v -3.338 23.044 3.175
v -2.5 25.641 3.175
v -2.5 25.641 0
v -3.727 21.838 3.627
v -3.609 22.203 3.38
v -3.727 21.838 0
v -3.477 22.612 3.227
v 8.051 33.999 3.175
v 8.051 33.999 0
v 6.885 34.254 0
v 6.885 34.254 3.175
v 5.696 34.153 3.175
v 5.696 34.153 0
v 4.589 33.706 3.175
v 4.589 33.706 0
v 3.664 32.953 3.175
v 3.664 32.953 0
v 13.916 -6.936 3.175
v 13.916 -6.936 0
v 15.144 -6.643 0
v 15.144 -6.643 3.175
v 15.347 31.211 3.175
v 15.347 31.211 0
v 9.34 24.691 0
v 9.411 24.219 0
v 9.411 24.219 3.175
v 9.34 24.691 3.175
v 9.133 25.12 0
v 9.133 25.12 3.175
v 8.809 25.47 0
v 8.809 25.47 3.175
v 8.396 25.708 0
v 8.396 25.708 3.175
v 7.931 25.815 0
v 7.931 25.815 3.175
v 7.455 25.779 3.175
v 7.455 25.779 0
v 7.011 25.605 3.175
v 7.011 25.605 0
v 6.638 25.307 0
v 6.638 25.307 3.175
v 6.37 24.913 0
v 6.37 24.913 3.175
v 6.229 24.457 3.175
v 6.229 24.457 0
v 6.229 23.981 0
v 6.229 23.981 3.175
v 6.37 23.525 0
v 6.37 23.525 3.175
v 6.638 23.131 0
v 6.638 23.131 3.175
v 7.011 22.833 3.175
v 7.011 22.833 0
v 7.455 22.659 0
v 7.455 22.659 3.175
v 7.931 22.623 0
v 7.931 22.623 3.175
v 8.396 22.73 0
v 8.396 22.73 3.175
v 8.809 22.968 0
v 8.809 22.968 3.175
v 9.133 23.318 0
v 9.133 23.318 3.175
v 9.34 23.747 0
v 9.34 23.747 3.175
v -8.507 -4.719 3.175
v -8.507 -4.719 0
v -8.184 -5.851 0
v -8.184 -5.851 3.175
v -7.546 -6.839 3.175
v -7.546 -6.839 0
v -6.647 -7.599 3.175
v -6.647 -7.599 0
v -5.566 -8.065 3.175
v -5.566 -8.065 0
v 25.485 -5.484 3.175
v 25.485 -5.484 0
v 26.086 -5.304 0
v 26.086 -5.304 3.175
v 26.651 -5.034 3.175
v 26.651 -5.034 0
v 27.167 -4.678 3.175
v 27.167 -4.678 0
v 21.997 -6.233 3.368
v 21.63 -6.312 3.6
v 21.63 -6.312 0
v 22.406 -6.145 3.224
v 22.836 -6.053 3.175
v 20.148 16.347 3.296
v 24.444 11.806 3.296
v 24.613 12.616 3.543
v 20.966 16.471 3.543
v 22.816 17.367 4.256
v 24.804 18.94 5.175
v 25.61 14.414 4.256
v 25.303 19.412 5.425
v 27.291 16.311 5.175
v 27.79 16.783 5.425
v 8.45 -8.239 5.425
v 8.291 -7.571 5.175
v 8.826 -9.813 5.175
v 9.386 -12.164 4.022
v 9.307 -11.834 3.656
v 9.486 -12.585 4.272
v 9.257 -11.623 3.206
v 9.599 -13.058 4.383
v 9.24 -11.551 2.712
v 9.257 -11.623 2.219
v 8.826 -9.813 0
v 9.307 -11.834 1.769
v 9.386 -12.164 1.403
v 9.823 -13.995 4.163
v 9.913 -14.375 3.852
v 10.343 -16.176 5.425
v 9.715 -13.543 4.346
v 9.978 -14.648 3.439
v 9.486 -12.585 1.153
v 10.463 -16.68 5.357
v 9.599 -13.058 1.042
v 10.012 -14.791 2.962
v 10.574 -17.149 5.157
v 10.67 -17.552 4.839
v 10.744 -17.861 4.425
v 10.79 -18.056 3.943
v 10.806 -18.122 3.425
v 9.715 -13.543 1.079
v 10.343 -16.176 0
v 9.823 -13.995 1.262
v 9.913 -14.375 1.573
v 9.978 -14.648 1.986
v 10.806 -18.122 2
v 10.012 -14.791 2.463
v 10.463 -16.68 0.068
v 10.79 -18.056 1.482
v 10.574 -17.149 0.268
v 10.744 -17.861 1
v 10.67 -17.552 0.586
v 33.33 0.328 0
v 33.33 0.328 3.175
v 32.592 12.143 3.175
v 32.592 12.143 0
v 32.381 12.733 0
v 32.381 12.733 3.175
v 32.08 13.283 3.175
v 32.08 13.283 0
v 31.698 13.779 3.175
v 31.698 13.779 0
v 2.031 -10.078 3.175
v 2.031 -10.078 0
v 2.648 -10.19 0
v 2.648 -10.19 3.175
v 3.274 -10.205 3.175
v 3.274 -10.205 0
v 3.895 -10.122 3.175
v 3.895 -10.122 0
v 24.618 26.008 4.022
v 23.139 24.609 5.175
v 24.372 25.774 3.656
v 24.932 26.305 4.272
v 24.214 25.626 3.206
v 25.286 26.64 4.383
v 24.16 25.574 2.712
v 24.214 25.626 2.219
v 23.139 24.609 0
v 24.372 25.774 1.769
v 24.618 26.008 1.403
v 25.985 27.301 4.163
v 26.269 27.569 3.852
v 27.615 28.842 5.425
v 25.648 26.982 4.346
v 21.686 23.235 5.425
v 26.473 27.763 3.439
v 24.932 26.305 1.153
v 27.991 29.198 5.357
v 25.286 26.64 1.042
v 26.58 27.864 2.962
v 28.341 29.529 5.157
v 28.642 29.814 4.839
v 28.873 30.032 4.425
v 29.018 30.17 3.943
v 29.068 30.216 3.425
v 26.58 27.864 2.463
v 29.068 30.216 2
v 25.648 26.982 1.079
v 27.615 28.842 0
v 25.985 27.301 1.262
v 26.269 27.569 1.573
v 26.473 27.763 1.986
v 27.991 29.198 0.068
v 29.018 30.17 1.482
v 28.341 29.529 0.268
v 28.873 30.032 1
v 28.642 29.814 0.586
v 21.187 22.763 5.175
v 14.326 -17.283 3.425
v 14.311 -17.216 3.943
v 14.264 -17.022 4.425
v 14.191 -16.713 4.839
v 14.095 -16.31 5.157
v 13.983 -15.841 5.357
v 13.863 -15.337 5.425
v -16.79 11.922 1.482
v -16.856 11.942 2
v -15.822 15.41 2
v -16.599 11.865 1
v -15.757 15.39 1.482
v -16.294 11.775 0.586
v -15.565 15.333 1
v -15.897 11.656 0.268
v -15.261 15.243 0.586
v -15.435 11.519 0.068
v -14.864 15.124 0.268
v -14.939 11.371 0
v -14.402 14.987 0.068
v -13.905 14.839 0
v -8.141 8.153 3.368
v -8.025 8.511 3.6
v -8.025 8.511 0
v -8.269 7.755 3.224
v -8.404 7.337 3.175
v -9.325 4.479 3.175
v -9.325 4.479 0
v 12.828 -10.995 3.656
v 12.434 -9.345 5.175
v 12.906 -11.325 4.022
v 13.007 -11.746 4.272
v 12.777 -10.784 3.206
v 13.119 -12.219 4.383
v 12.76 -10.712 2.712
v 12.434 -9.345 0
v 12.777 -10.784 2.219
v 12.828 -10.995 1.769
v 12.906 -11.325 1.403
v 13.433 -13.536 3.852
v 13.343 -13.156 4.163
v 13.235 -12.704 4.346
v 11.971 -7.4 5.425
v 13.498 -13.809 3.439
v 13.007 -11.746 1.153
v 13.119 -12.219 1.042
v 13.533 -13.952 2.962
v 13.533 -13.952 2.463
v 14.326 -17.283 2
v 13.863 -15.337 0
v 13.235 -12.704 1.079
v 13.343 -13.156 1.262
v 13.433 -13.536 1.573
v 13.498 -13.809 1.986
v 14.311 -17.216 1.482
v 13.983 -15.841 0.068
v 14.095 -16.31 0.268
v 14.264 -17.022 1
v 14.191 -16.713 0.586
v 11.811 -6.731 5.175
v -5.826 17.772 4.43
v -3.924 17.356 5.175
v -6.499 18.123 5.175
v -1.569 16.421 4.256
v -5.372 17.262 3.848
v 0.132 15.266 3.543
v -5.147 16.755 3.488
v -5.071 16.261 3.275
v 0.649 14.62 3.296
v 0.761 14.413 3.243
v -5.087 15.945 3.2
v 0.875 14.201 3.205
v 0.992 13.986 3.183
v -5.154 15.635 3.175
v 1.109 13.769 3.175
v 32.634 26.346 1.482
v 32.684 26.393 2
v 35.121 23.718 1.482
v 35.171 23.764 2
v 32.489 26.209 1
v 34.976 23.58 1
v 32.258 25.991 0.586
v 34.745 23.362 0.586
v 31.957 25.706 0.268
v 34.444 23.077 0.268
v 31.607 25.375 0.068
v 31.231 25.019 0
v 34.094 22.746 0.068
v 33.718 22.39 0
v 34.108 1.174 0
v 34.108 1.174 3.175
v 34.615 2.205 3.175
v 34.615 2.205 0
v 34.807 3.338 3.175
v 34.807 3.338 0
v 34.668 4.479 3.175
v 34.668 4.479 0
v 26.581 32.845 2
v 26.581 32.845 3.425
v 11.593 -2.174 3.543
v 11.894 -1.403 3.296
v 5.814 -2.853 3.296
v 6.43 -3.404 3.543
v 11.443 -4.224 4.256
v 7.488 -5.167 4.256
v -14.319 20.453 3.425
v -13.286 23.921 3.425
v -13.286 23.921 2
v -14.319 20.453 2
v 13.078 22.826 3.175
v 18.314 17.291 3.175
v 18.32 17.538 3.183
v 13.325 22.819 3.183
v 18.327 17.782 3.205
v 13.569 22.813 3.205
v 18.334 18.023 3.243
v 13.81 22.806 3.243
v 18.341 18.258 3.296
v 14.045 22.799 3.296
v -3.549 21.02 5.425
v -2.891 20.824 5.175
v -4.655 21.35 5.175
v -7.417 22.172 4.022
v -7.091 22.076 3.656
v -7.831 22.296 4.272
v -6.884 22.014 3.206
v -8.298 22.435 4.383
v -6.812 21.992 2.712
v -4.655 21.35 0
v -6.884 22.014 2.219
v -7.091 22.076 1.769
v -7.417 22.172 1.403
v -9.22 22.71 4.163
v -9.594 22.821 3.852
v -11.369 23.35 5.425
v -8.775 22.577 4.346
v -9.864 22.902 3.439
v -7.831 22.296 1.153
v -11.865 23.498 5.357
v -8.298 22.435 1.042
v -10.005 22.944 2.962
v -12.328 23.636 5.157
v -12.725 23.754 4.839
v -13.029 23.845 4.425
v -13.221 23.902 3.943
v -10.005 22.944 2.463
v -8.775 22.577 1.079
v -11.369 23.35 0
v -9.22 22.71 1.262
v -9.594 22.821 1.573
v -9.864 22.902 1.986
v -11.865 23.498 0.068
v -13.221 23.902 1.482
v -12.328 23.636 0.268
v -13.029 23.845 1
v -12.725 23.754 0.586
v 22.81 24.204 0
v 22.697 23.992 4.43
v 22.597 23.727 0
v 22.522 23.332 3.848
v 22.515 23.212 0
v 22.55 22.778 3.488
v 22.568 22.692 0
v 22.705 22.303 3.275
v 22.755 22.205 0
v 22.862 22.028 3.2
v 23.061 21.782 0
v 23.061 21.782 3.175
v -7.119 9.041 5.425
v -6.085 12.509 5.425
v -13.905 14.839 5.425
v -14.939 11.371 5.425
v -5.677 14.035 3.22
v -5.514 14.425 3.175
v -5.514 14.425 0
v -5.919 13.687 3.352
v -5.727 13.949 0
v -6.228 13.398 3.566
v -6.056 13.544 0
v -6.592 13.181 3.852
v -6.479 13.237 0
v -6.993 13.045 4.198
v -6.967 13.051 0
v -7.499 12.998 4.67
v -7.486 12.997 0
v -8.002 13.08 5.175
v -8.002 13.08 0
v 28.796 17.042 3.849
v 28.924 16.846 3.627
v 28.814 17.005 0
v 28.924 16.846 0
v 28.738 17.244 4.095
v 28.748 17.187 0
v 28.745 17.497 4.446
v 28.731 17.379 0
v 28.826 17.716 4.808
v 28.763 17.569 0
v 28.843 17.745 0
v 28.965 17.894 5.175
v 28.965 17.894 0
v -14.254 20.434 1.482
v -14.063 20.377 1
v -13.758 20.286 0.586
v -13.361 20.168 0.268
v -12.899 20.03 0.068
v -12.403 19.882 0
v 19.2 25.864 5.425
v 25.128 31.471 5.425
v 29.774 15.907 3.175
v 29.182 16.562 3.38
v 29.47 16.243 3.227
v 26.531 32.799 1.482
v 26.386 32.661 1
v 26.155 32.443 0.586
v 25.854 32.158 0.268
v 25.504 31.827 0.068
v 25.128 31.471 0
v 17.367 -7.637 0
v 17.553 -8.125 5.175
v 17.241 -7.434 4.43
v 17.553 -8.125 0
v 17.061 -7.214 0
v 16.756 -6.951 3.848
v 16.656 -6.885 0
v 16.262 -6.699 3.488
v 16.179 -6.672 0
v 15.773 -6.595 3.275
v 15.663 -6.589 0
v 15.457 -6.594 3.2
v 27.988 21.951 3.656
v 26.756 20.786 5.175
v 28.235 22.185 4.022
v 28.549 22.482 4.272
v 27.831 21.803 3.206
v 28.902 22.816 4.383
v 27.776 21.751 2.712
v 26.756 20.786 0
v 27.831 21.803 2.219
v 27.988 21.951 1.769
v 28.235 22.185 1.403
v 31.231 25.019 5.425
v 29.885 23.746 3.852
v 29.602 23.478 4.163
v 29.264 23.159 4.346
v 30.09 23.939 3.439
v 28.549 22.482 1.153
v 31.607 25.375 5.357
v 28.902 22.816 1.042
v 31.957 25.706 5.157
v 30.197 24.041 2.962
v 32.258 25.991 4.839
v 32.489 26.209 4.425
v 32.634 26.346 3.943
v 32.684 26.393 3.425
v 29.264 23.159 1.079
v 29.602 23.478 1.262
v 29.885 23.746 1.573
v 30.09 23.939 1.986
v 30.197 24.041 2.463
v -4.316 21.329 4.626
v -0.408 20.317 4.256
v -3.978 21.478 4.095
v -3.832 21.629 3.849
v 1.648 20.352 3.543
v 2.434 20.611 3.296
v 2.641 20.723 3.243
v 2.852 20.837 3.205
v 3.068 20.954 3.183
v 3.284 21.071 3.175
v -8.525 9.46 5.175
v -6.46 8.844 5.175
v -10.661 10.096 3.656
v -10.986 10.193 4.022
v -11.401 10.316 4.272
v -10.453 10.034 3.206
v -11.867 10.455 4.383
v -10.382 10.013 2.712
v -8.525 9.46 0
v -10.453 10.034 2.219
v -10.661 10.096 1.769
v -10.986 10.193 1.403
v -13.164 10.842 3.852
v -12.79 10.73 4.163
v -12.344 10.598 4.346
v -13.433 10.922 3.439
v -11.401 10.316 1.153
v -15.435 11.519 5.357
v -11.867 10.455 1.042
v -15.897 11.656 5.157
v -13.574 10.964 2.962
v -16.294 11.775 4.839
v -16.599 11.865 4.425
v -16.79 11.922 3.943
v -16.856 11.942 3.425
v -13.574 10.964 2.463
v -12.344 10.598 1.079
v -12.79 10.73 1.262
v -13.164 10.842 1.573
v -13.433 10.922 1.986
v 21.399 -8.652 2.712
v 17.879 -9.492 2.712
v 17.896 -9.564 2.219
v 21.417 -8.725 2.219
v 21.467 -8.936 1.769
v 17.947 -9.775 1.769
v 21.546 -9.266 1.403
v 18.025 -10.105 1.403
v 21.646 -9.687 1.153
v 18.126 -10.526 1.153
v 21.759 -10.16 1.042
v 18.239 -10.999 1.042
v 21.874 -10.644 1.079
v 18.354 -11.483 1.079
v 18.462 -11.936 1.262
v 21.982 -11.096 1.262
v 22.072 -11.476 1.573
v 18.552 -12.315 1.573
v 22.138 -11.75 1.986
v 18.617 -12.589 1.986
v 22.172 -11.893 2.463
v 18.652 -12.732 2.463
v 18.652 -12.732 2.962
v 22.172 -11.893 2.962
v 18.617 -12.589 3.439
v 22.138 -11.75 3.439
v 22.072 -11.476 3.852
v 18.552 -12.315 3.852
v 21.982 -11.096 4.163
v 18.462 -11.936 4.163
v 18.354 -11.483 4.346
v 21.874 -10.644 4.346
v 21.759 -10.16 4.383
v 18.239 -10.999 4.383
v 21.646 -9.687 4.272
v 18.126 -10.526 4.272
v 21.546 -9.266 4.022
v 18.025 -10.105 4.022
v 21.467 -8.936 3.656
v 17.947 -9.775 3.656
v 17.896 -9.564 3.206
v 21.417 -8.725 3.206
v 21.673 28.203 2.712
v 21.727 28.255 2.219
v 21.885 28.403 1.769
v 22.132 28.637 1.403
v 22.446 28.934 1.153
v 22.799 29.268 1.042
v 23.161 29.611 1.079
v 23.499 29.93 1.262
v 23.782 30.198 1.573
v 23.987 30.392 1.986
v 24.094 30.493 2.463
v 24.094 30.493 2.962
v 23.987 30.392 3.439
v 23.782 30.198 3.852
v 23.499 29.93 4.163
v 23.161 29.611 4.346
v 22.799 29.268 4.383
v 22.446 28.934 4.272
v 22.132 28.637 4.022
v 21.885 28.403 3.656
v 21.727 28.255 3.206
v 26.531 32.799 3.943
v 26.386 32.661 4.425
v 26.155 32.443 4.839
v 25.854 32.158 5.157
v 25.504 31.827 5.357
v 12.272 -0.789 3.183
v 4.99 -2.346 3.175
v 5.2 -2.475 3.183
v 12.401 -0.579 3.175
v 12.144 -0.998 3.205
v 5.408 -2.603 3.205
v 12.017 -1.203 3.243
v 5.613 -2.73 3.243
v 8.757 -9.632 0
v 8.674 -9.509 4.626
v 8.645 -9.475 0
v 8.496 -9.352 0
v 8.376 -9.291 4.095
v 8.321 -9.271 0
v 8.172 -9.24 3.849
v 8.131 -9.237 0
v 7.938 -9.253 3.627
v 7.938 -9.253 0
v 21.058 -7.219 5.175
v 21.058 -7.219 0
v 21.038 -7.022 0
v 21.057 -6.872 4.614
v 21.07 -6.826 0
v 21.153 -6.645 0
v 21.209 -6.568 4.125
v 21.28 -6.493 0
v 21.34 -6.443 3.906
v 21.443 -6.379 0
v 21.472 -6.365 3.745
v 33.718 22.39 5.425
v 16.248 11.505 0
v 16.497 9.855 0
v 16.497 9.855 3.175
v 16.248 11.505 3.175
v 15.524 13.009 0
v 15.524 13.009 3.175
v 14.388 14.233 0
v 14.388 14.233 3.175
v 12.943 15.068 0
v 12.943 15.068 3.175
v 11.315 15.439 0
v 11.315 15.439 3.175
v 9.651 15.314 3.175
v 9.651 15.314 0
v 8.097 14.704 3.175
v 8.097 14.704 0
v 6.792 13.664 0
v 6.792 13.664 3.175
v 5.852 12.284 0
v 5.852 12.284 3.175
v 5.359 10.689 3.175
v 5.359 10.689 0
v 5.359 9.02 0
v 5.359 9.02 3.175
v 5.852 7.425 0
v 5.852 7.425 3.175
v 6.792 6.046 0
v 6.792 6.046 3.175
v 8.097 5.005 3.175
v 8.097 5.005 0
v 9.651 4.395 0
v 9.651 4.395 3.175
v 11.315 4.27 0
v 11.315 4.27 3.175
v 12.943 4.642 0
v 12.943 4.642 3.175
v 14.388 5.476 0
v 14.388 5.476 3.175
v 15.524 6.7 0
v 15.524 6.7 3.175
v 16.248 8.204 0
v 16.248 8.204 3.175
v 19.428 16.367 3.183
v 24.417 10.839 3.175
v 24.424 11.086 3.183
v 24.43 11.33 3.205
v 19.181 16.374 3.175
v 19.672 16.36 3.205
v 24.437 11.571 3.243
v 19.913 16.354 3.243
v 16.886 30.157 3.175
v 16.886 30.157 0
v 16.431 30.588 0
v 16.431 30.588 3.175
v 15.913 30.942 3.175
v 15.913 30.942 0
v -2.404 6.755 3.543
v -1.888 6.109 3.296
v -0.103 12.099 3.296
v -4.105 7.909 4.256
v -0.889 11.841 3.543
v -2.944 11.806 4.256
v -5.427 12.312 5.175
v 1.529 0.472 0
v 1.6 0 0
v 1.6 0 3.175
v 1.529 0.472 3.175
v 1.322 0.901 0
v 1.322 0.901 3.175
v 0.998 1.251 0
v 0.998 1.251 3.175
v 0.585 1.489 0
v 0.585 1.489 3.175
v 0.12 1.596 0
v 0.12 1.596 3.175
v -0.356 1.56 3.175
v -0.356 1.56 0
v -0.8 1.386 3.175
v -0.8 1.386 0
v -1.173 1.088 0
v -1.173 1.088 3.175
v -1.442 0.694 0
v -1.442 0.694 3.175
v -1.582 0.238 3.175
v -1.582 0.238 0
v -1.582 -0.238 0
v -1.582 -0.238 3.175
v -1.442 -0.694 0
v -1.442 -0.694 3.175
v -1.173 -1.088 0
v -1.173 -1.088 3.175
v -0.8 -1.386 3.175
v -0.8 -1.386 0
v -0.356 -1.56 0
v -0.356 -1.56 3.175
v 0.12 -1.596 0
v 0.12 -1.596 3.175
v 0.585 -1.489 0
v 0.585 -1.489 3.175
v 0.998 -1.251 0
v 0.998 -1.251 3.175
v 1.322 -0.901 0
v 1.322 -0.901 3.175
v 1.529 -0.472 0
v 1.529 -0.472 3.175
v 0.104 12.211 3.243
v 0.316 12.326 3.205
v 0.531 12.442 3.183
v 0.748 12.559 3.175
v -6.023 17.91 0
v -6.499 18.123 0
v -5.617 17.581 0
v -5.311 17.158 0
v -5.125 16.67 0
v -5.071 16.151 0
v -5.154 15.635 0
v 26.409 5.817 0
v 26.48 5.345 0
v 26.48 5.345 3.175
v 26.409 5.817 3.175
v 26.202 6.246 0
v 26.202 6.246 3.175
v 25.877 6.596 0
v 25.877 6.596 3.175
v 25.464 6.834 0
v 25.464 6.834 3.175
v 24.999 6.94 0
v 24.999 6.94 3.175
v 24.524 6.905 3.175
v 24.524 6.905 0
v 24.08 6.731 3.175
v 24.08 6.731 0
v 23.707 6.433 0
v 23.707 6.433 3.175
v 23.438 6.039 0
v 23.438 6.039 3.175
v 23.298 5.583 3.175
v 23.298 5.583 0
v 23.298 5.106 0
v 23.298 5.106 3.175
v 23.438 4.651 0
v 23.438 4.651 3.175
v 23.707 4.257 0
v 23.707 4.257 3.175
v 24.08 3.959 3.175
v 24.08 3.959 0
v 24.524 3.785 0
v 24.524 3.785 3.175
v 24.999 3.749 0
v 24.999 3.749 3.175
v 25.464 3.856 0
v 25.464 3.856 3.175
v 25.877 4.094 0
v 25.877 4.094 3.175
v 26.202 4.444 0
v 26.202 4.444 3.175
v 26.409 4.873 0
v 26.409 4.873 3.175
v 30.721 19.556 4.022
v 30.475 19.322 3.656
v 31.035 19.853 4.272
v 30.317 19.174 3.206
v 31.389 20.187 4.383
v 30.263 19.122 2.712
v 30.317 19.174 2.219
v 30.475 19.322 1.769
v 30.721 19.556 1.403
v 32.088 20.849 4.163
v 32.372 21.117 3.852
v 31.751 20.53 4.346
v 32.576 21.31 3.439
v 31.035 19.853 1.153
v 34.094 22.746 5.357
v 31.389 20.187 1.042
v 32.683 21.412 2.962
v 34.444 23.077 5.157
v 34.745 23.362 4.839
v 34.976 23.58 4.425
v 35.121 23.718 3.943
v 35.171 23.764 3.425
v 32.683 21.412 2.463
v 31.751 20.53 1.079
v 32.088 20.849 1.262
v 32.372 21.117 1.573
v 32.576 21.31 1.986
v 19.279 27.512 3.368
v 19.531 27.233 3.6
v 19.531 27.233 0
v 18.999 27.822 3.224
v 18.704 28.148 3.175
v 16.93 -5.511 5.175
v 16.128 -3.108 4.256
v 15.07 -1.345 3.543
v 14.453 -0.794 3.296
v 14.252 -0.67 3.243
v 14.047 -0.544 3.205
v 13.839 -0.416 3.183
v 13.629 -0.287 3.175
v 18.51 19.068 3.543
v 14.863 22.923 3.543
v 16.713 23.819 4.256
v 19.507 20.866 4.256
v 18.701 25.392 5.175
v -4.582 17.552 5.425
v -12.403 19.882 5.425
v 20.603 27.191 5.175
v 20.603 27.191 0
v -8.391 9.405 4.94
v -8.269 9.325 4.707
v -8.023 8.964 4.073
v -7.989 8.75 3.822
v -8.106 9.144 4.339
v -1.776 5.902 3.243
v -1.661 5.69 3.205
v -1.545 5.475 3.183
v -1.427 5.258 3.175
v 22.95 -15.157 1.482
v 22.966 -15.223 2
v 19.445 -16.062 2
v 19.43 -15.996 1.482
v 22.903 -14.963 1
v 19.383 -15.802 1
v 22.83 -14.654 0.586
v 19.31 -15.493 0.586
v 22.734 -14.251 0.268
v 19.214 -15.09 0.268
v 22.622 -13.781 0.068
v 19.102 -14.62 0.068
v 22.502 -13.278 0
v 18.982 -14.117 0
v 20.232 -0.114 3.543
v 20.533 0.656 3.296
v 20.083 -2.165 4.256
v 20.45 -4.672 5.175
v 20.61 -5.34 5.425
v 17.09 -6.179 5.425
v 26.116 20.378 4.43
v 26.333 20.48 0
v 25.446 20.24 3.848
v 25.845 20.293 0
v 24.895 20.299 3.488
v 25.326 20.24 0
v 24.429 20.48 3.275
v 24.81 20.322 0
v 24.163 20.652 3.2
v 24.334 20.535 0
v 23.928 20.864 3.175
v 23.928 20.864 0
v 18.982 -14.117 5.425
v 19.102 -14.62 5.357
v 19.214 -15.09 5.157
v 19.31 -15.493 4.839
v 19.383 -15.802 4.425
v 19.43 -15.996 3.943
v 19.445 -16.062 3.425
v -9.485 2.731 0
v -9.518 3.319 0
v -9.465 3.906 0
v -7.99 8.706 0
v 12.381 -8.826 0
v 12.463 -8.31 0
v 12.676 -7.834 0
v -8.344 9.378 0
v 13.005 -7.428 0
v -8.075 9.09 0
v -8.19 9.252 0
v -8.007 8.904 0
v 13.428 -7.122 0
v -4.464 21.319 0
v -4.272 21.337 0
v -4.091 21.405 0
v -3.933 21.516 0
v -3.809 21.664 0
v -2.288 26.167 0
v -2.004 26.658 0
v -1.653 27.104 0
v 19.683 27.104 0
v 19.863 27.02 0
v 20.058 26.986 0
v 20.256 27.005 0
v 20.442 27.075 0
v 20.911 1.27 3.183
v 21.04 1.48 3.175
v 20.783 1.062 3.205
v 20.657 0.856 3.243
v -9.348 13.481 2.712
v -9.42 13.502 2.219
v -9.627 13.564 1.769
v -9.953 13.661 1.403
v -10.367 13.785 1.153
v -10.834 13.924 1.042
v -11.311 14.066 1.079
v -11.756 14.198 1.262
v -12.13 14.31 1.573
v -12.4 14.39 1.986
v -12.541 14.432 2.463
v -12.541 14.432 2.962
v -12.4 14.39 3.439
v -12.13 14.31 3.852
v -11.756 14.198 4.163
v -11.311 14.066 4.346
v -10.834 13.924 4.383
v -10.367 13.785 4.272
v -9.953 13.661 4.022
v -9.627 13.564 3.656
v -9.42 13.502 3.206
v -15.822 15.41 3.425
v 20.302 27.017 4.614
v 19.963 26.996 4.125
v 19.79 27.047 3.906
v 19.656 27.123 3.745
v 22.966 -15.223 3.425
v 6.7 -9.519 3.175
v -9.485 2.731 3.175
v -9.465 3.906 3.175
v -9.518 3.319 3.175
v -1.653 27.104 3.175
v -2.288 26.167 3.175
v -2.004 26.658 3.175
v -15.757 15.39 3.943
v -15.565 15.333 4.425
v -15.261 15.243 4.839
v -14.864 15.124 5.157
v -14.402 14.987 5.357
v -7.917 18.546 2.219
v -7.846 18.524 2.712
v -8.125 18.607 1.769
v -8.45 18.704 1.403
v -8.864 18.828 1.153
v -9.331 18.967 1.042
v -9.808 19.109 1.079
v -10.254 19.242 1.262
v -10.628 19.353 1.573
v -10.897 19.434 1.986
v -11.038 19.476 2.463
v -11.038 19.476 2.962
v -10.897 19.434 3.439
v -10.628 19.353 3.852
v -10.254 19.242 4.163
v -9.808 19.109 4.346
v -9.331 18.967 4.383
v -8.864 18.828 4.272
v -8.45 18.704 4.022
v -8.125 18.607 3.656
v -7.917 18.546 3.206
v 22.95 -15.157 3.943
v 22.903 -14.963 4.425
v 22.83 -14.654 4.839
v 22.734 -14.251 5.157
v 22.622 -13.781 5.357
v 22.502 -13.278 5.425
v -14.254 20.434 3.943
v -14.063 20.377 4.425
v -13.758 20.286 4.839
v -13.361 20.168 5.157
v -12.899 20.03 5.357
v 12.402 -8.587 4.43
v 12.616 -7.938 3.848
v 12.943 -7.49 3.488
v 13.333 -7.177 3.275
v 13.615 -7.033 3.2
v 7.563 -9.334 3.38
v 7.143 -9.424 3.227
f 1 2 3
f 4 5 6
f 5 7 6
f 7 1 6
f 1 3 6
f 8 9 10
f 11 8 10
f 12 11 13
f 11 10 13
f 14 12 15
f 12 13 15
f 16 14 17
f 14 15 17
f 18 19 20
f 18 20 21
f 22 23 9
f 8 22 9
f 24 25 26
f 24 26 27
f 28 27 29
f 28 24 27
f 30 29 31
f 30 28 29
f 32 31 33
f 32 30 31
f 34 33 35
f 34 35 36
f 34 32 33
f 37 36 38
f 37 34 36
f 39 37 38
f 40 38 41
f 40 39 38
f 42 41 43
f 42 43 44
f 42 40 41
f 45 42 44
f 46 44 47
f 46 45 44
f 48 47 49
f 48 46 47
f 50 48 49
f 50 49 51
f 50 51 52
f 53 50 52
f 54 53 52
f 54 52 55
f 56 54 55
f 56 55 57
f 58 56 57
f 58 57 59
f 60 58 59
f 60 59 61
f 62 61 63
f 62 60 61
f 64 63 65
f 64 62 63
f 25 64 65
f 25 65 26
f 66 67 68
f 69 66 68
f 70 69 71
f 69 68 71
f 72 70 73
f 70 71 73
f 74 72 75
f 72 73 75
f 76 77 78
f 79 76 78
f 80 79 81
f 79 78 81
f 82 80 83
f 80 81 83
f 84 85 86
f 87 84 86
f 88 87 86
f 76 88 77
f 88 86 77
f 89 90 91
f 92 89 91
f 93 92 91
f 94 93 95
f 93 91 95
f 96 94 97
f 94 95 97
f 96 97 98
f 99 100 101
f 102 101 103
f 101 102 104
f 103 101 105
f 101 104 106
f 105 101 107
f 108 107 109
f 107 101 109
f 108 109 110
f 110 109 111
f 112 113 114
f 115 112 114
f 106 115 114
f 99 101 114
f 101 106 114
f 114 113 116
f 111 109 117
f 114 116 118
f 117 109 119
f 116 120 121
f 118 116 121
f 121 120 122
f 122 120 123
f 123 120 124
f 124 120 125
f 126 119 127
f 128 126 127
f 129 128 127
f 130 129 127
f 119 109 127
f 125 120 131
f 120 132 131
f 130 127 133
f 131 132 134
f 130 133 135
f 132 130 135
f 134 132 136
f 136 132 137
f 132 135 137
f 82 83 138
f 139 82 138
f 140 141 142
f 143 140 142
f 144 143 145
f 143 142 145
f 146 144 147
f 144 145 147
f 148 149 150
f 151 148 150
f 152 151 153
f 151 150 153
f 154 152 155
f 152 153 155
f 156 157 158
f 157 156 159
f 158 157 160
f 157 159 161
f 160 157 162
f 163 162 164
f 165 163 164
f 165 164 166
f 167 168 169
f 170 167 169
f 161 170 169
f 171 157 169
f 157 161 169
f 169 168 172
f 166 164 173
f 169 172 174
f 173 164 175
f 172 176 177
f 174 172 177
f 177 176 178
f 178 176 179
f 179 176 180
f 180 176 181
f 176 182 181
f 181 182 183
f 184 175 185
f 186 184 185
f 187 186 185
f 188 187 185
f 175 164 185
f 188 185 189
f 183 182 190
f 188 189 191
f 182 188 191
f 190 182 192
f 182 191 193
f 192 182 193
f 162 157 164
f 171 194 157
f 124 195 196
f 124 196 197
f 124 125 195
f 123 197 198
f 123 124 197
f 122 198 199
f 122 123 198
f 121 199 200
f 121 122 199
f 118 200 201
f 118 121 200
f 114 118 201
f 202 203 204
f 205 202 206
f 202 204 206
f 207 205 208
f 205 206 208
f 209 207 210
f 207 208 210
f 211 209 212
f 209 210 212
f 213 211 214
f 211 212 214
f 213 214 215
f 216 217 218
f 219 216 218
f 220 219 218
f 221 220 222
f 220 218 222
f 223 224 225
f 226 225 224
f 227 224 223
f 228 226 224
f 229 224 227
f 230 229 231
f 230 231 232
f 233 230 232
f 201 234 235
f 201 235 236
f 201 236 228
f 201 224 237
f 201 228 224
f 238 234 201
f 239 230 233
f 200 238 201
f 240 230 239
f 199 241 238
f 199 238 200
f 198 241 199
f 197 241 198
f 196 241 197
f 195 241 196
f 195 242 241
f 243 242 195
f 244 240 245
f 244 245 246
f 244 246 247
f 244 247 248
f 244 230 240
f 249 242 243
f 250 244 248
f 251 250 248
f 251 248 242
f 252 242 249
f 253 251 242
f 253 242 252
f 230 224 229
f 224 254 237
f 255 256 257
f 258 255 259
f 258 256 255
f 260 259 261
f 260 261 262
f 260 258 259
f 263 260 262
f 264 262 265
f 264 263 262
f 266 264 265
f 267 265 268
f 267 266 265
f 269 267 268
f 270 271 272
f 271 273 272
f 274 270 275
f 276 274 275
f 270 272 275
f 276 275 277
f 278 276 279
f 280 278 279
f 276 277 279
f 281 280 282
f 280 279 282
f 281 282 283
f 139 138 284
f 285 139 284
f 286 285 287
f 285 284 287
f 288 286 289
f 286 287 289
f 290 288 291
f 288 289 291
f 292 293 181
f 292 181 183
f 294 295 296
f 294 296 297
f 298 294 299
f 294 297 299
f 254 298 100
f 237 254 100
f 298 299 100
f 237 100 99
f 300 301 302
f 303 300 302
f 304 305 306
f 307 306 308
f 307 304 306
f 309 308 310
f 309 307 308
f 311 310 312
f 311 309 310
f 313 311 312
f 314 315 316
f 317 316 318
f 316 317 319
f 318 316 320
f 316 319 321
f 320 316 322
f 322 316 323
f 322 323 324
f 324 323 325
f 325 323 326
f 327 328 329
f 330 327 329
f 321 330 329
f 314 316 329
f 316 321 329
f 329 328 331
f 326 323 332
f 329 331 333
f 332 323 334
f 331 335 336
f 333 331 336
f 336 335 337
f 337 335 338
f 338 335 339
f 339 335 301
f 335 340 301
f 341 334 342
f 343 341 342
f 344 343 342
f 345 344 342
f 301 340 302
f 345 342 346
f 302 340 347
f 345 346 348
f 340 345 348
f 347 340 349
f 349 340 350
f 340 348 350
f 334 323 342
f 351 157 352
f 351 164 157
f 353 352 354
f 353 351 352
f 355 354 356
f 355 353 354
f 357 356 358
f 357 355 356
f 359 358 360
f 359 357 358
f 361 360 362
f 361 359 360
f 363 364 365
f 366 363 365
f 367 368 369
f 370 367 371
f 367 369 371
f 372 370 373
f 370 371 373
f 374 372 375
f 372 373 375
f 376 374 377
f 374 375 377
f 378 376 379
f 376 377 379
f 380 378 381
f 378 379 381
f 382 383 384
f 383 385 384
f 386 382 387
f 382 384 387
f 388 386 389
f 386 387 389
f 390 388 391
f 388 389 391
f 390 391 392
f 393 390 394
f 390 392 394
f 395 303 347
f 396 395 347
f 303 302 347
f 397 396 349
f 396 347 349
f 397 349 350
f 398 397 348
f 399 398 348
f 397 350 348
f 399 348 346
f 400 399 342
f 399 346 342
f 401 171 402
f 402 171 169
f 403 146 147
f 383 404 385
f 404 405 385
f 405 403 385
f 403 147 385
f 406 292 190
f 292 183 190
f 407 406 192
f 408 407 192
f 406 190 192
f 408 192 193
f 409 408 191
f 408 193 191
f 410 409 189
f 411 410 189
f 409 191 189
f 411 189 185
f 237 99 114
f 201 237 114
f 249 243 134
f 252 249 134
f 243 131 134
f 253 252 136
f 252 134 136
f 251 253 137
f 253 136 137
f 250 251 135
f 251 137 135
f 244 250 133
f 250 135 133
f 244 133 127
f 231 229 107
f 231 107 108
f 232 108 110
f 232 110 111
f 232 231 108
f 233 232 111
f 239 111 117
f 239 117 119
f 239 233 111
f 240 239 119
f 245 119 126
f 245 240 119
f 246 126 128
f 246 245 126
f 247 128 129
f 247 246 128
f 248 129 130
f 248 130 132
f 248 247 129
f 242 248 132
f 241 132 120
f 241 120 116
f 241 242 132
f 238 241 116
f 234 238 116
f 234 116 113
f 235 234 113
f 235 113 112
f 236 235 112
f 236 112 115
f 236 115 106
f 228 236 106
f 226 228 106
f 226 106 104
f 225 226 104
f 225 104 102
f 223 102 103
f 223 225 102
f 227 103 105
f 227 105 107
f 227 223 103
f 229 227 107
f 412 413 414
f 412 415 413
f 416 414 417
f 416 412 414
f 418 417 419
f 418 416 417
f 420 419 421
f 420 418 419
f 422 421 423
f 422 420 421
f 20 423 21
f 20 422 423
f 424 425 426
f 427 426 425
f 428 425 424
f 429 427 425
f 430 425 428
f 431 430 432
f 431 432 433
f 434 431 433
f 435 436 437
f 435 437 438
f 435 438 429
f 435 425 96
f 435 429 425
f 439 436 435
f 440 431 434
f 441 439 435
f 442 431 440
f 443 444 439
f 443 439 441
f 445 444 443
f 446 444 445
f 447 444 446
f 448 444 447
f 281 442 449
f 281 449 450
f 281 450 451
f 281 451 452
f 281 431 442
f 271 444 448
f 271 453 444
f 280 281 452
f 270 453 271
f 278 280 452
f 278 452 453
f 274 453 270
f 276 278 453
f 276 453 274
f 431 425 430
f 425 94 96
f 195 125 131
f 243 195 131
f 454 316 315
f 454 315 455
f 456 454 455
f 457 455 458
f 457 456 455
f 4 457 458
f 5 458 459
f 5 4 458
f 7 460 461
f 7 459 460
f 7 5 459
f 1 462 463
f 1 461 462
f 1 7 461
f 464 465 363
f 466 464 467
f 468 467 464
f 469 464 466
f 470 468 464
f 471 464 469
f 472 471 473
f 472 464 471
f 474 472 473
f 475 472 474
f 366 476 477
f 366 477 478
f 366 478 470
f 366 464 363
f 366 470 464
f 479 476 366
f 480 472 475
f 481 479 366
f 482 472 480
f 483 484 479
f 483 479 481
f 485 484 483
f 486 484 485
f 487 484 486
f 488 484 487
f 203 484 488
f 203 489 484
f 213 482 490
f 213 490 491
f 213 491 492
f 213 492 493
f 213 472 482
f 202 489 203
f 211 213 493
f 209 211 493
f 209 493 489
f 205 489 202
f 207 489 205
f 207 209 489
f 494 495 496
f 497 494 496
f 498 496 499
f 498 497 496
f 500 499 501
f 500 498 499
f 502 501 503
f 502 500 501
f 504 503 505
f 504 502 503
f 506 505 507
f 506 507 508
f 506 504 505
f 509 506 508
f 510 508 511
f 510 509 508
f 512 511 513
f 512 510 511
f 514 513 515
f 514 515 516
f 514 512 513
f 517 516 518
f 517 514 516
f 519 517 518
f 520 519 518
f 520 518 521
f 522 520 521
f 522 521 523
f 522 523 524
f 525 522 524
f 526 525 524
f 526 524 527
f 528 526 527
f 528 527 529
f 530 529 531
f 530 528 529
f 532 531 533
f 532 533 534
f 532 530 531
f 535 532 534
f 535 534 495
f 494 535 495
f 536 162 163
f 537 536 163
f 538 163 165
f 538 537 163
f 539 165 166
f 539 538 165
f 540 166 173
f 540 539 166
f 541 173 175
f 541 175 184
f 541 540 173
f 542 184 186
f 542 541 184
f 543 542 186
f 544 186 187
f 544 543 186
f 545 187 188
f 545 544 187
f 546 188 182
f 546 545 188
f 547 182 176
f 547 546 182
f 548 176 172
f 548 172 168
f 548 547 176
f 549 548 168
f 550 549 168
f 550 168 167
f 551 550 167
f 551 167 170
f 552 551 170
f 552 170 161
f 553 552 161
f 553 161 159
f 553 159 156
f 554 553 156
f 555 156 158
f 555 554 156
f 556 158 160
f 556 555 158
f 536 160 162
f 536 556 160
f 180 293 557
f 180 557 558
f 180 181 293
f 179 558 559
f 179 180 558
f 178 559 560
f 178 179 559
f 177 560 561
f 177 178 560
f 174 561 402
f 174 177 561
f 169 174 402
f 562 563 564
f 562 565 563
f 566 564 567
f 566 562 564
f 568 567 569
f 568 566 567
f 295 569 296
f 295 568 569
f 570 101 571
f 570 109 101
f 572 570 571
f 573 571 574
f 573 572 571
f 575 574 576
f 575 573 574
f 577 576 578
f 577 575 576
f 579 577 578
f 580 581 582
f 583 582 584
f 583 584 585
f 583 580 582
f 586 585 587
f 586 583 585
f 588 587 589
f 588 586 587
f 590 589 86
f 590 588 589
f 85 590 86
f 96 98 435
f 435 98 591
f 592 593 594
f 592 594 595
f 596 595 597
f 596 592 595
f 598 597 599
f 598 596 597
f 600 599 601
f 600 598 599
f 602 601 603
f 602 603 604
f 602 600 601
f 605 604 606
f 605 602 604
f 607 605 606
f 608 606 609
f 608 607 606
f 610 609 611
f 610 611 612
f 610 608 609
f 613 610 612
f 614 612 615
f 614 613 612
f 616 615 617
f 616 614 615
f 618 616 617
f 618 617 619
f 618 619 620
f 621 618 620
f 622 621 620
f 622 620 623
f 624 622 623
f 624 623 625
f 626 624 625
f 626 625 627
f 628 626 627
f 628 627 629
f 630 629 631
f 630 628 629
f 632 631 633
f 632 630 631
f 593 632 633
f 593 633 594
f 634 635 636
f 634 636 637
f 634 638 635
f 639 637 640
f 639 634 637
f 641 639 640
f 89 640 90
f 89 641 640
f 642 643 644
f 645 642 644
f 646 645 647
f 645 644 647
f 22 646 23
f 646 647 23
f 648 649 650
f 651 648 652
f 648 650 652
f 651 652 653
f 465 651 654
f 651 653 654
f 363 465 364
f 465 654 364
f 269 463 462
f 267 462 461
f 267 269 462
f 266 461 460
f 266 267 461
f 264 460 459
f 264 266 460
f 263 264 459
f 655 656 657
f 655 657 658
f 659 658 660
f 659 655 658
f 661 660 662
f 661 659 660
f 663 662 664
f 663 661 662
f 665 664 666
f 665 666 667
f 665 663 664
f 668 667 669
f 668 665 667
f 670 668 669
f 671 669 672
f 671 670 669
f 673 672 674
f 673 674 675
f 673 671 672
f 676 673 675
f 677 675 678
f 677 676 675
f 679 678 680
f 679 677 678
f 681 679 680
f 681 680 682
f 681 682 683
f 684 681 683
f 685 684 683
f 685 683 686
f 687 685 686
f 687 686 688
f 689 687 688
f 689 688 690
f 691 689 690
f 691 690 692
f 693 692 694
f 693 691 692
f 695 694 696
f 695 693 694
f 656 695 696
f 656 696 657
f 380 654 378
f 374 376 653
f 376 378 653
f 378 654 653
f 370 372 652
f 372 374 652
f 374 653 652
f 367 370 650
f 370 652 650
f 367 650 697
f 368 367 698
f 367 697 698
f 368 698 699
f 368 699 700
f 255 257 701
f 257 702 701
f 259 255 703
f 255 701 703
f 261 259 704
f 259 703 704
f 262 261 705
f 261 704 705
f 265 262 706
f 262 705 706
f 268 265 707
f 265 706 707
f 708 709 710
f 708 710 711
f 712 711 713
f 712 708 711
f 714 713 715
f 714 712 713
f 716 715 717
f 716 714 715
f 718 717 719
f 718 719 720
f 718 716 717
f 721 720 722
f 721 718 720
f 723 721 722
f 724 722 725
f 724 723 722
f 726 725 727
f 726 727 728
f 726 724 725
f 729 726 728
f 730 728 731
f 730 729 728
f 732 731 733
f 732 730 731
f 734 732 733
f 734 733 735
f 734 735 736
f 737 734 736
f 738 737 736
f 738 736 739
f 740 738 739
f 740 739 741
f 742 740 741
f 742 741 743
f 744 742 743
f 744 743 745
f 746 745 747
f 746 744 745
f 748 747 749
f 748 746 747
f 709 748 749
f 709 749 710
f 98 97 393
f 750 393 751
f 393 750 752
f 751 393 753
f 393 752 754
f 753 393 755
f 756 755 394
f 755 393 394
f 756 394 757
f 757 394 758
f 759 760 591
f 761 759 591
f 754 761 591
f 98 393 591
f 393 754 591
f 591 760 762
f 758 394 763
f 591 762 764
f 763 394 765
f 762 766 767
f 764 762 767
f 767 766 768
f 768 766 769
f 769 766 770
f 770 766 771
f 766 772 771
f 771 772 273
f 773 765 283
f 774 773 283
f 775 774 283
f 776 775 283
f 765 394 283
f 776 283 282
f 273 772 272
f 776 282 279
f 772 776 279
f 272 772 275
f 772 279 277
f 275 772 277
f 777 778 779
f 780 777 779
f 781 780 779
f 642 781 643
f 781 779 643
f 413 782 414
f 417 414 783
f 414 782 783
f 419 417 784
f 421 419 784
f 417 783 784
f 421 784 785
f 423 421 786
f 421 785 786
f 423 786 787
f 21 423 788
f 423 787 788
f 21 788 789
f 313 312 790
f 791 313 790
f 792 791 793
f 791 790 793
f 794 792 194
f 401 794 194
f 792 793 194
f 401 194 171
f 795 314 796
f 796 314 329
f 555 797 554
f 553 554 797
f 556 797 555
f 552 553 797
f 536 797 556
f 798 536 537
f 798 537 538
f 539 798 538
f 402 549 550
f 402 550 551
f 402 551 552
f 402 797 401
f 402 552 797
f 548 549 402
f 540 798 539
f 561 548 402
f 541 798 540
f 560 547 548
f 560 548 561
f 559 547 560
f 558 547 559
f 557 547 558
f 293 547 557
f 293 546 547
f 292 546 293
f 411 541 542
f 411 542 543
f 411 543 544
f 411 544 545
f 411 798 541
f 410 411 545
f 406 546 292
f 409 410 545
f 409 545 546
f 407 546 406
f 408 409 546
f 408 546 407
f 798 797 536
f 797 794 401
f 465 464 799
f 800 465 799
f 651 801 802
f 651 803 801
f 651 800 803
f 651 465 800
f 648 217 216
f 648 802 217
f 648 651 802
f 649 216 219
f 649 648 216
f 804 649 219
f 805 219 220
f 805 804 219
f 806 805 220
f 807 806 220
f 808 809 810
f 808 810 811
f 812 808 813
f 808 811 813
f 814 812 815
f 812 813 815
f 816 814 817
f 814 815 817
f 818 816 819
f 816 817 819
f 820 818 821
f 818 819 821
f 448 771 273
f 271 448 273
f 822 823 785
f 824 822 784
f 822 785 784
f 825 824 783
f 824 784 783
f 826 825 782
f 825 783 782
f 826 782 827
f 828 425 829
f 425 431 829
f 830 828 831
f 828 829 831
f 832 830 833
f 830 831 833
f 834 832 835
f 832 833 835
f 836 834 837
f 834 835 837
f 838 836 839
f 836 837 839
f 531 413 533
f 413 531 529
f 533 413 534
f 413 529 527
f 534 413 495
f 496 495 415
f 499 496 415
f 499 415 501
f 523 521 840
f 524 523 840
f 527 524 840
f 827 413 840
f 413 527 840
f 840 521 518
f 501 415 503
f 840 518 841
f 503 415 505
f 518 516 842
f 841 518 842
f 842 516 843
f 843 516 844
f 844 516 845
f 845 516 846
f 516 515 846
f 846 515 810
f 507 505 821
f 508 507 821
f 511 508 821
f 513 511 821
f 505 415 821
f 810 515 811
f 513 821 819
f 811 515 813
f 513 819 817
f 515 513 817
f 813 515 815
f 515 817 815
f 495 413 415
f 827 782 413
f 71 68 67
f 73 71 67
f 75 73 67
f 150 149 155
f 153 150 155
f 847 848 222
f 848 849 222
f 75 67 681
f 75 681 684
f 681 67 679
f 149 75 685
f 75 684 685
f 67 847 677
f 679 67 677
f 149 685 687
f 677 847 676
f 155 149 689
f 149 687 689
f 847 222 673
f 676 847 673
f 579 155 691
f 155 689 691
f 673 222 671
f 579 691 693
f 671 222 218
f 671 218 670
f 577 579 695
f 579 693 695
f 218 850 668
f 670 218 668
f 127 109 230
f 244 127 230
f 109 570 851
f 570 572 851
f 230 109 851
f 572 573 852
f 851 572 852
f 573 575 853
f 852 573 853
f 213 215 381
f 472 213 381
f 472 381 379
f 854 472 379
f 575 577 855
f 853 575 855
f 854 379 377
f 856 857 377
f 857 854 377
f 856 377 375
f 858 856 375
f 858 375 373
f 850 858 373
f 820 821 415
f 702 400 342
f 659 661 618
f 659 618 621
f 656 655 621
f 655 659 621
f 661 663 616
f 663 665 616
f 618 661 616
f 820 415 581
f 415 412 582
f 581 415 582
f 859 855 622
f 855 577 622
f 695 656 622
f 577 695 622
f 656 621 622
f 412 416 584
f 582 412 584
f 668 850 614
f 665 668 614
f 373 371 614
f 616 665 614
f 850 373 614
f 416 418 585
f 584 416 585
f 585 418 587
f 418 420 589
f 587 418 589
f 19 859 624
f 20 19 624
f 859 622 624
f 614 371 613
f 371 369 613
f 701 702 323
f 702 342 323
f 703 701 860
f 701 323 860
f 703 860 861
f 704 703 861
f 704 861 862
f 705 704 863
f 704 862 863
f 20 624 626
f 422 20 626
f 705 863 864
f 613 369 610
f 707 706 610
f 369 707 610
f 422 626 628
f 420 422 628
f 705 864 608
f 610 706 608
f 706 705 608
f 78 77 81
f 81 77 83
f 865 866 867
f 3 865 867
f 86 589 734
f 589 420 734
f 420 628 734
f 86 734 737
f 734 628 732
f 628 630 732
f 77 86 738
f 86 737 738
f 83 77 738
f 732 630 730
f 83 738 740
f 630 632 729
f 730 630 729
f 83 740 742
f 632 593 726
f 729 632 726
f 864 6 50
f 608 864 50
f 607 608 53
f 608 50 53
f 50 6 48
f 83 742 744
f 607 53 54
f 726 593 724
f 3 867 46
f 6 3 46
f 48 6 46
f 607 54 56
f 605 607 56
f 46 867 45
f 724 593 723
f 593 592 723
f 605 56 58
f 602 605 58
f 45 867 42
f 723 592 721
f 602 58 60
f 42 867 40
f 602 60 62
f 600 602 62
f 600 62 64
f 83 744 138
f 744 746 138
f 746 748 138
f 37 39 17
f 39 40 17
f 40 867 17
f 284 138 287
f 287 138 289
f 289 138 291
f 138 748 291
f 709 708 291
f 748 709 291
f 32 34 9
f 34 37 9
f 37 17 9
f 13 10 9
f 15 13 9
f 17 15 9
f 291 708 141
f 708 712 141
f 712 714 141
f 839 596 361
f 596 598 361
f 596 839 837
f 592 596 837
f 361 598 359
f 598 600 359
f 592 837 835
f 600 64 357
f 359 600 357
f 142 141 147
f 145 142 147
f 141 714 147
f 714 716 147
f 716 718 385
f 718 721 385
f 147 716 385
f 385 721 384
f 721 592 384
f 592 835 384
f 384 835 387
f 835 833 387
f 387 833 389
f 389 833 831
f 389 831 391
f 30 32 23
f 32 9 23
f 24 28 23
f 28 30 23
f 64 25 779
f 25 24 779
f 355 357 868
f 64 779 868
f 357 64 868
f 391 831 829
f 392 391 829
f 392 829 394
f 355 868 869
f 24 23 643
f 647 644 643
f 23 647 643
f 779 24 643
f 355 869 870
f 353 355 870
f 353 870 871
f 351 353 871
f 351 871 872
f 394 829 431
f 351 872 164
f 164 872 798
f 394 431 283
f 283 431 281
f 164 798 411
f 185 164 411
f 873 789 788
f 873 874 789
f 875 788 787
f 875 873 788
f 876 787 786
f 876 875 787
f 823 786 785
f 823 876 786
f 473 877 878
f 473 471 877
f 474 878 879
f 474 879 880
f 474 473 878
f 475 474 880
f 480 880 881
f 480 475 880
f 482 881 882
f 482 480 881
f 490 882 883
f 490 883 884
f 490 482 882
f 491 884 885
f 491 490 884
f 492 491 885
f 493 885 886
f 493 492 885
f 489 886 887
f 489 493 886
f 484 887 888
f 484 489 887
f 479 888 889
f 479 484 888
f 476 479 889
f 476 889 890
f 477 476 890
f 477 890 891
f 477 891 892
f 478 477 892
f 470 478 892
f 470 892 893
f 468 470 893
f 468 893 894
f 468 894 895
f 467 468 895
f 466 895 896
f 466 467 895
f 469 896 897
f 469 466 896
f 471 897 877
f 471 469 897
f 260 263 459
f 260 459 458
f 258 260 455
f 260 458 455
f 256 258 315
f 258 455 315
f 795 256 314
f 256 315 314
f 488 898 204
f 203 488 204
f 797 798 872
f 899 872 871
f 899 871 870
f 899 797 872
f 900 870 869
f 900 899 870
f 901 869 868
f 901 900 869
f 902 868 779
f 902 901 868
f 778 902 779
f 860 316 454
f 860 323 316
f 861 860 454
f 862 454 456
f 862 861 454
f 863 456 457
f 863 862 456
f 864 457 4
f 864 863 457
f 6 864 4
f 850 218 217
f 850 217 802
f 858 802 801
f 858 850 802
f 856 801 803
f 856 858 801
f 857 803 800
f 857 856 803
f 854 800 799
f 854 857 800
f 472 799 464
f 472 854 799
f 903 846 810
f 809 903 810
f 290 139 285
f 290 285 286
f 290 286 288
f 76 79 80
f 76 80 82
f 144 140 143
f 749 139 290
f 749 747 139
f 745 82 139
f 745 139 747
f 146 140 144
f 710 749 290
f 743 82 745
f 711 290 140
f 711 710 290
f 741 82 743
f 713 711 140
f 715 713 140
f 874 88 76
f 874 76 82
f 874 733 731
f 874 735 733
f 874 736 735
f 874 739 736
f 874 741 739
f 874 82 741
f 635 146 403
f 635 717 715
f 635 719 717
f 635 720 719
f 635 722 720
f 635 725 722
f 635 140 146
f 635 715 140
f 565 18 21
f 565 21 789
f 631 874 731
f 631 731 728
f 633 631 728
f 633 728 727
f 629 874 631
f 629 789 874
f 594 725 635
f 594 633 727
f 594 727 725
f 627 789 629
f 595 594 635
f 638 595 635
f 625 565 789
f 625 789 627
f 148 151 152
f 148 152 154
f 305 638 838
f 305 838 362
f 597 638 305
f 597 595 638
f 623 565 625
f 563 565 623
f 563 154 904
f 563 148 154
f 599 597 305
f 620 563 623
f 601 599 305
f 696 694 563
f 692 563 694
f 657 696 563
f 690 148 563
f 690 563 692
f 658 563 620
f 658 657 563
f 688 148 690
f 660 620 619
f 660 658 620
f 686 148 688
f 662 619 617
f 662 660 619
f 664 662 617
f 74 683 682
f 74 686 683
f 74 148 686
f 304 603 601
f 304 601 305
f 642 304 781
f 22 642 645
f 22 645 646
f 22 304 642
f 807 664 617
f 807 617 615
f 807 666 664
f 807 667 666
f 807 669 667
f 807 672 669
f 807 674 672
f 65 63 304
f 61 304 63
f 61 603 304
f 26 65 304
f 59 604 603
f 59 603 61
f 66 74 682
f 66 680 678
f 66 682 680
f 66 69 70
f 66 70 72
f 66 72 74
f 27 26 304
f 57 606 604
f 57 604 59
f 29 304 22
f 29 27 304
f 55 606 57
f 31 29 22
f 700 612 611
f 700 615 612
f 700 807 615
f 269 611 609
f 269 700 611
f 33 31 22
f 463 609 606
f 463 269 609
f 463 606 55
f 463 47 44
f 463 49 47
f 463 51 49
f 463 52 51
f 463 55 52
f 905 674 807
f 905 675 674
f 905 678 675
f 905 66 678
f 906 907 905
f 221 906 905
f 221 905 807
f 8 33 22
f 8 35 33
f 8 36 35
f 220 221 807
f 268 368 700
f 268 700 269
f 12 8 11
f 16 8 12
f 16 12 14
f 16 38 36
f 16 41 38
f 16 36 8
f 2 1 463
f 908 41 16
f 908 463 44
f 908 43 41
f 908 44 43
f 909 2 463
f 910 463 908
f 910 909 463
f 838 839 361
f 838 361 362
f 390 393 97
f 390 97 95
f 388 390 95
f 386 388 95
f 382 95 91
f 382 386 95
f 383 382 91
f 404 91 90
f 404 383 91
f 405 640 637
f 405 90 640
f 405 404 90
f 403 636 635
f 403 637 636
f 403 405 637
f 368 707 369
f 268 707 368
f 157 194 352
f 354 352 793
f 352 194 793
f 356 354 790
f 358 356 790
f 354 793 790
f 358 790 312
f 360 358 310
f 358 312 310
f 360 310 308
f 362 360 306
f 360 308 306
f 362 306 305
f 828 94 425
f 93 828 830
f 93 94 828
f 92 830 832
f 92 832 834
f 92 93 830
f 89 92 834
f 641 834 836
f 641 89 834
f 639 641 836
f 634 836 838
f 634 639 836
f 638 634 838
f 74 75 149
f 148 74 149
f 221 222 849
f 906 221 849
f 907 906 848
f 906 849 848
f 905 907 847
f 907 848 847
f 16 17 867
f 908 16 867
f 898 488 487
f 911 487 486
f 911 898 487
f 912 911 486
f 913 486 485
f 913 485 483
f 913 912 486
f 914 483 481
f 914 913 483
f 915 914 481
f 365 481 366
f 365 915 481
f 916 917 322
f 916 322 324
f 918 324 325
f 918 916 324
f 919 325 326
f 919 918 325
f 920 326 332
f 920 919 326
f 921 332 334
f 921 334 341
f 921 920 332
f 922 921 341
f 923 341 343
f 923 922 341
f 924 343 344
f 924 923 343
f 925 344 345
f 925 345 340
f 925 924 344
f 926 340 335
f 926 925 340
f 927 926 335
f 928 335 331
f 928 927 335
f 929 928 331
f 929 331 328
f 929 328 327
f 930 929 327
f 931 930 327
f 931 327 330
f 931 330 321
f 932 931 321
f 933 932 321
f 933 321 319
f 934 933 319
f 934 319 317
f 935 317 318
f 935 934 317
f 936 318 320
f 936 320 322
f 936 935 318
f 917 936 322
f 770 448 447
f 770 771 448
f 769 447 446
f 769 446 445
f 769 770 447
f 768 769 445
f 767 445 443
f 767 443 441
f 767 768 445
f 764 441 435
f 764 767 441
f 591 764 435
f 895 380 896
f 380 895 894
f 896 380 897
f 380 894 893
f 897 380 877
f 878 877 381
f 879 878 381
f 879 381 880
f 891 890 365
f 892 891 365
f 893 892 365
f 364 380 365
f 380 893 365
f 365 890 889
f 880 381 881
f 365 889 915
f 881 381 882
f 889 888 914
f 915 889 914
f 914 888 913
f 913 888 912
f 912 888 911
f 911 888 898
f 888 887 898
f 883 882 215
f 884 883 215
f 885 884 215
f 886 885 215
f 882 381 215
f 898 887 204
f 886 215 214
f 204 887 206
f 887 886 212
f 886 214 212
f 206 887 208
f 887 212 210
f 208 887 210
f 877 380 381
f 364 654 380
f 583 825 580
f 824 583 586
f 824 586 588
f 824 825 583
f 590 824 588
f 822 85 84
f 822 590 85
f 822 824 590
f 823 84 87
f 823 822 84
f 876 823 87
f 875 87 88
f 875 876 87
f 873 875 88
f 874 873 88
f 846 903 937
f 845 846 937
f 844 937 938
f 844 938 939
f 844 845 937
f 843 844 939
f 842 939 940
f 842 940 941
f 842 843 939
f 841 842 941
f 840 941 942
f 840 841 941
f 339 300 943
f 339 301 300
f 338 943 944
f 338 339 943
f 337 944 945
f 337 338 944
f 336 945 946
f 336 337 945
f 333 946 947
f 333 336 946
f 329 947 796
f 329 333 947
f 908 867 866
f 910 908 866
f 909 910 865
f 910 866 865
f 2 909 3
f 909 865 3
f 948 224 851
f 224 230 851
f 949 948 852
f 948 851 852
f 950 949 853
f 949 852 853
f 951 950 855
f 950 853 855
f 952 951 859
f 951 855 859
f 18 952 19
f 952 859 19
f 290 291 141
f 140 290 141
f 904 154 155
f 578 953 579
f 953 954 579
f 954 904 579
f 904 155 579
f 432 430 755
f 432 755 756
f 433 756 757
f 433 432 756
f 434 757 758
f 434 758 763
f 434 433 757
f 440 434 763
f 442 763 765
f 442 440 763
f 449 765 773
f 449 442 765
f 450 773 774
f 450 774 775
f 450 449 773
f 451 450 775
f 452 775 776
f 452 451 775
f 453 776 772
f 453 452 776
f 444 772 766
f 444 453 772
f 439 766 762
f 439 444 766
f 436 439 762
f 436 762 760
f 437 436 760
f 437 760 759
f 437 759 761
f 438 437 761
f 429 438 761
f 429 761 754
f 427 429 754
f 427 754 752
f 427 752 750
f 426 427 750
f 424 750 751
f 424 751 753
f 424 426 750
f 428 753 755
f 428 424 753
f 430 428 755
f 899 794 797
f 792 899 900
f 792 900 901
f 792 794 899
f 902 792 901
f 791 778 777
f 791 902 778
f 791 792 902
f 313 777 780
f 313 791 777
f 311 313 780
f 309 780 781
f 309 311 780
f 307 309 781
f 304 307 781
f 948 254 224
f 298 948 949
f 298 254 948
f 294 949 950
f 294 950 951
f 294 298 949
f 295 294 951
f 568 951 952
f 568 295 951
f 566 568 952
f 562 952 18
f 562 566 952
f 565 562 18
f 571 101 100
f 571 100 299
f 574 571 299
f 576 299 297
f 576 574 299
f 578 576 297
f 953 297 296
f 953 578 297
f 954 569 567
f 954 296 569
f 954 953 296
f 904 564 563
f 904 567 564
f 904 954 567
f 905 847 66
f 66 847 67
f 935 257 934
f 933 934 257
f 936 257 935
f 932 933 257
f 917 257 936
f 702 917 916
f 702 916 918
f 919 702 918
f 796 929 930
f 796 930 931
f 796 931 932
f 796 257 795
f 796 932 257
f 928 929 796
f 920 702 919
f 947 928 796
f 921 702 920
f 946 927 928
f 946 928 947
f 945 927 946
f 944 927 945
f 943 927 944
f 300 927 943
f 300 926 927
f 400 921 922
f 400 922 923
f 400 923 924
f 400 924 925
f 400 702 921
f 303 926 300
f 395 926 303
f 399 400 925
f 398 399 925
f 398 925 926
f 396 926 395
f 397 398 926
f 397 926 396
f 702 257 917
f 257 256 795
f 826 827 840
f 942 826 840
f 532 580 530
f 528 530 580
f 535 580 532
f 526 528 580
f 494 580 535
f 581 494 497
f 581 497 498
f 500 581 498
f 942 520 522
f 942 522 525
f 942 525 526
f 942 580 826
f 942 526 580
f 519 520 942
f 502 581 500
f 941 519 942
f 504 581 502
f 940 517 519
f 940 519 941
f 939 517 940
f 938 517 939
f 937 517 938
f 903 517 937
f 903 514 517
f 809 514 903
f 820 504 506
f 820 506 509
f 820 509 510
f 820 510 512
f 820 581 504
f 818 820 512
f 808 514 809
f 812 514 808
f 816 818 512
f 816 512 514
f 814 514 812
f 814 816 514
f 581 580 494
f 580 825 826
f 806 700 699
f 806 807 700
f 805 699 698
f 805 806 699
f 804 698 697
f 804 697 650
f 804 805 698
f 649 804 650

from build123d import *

# Parameters (mm, degrees)
SKETCH1_R                = 1.6
SKETCH1_R_2              = 5.6
BOSS_EXTRUDE1_DEPTH      = 3.175
SKETCH4_R                = 1.675
BOSS_EXTRUDE3_DEPTH      = 6.25
SKETCH4_2_R              = 1.675
CUT_EXTRUDE2_DEPTH       = 2.63125
FILLET1_R                = 2
FILLET2_R                = 2
FILLET3_R                = 2
CIRPATTERN2_COUNT        = 3
FILLET1_OF_CIRPATTERN2_R = 2
FILLET2_OF_CIRPATTERN2_R = 2
FILLET3_OF_CIRPATTERN2_R = 2
FILLET5_R                = 0.75


with BuildPart() as part:
    # Sketch1 → Boss-Extrude1 (new body)
    with BuildSketch(Plane.XY):
        with BuildLine():
            Line((15.347308801, 31.210973101), (8.051491314, 33.998880179))
            ThreePointArc((8.051491314, 33.998880179), (5.696175566, 34.15336703), (3.663829908, 32.952971436))
            Line((3.663829908, 32.952971436), (-1.653149933, 27.103867562))
            ThreePointArc((-1.653149933, 27.103867562), (-2.154824203, 26.417727613), (-2.500196213, 25.641078866))
            Line((-2.500196213, 25.641078866), (-9.325438013, 4.478720632))
            ThreePointArc((-9.325438013, 4.478720632), (-9.502063256, 3.613546149), (-9.484560317, 2.730700176))
            Line((-9.484560317, 2.730700176), (-8.507421128, -4.718687488))
            ThreePointArc((-8.507421128, -4.718687488), (-7.54564448, -6.839386894), (-5.565731281, -8.065080174))
            Line((-5.565731281, -8.065080174), (2.031002829, -10.077591551))
            ThreePointArc((2.031002829, -10.077591551), (2.960636861, -10.209852347), (3.895489669, -10.121746843))
            Line((3.895489669, -10.121746843), (25.485057009, -5.483666514))
            ThreePointArc((25.485057009, -5.483666514), (26.373611638, -5.180049941), (27.166902489, -4.677653705))
            Line((27.166902489, -4.677653705), (33.329625608, 0.328323939))
            ThreePointArc((33.329625608, 0.328323939), (34.614533997, 2.205289229), (34.668387555, 4.479291881))
            Line((34.668387555, 4.479291881), (32.591741985, 12.142614371))
            ThreePointArc((32.591741985, 12.142614371), (32.241466178, 13.013831458), (31.697738169, 13.779384986))
            Line((31.697738169, 13.779384986), (16.88625911, 30.157458595))
            ThreePointArc((16.88625911, 30.157458595), (16.17904213, 30.77516119), (15.347308801, 31.210973101))
        make_face()
        with Locations((24.879793107, 5.344918551)):
            Circle(SKETCH1_R, mode=Mode.SUBTRACT)
        with Locations((7.811061307, 24.218992148)):
            Circle(SKETCH1_R, mode=Mode.SUBTRACT)
        Circle(SKETCH1_R, mode=Mode.SUBTRACT)
        with Locations((10.896951472, 9.8546369)):
            Circle(SKETCH1_R_2, mode=Mode.SUBTRACT)
    extrude(amount=BOSS_EXTRUDE1_DEPTH)

    # Sketch4 → Boss-Extrude3 (add, symmetric)
    with BuildSketch(Plane(origin=(0.449621982, -0.475334512, 0), x_dir=(-0.726482741, -0.687184711, 0), z_dir=(0.687184711, -0.726482741, 0))):
        Polygon((-31.72132028, 0), (-31.72132028, -3.175), (-25.539496086, -3.175), (-31.72132028, -5.425), (-41.88132028, -5.425), (-41.88132028, 0), align=None)
        with Locations((-36.80132028, -2.7125)):
            Circle(SKETCH4_R, mode=Mode.SUBTRACT)
    boss_extrude3 = extrude(amount=BOSS_EXTRUDE3_DEPTH, both=True)

    # Sketch4<2> → Cut-Extrude2 (cut, symmetric)
    with BuildSketch(Plane(origin=(0.449621982, -0.475334512, 0), x_dir=(-0.726482741, -0.687184711, 0), z_dir=(0.687184711, -0.726482741, 0))):
        Polygon((-31.72132028, 0), (-31.72132028, -3.175), (-25.539496086, -3.175), (-31.72132028, -5.425), (-41.88132028, -5.425), (-41.88132028, 0), align=None)
        with Locations((-36.80132028, -2.7125)):
            Circle(SKETCH4_2_R, mode=Mode.SUBTRACT)
    cut_extrude2 = extrude(amount=CUT_EXTRUDE2_DEPTH, both=True, mode=Mode.SUBTRACT)

    # Fillet1
    fillet1_edges = [part.edges().sort_by_distance(p)[0] for p in [
        (19.440964609, 21.110601986, 3.175),
        (23.057274153, 17.287486564, 3.175),
        (25.865326768, 14.96244967, 3.175),
        (17.377217607, 24.139682361, 3.175),
        (22.0551547, 13.848979318, 3.175),
        (15.952095481, 20.301054157, 3.175),
    ]]
    fillet(fillet1_edges, radius=FILLET1_R)

    # Fillet2
    fillet2_edges = [part.edges().sort_by_distance(p)[0] for p in [
        (25.302768444, 19.411514101, 1.5875),
        (21.6864589, 23.234629523, 1.5875),
    ]]
    fillet(fillet2_edges, radius=FILLET2_R)

    # Fillet3
    fillet3_edges = [part.edges().sort_by_distance(p)[0] for p in [
        (33.927207925, 25.078831062, 0),
        (33.927207925, 25.078831062, 5.425),
        (27.824148706, 31.530905901, 5.425),
        (27.824148706, 31.530905901, 0),
    ]]
    fillet(fillet3_edges, radius=FILLET3_R)

    # CirPattern2: Boss-Extrude3, Cut-Extrude2 ×3 about axis
    cirpattern2_axis = Axis((10.896951472, 9.8546369, 0), (0, 0, 1))
    for i in range(1, CIRPATTERN2_COUNT):
        add(boss_extrude3.rotate(cirpattern2_axis, i * 360 / CIRPATTERN2_COUNT))
        add(cut_extrude2.rotate(cirpattern2_axis, i * 360 / CIRPATTERN2_COUNT), mode=Mode.SUBTRACT)

    # Fillet1 of CirPattern2
    fillet1_of_cirpattern2_edges = [part.edges().sort_by_distance(p)[0] for p in [
        (-3.123006806, 11.625986784, 3.175),
        (-1.620246501, 16.669360428, 3.175),
        (-1.010731793, 20.263723774, 3.175),
        (-4.71439386, 8.324189266, 3.175),
        (1.858647852, 17.520753147, 3.175),
        (-0.677483256, 9.009311403, 3.175),
        (16.372896612, -3.172678071, 3.175),
        (11.253826762, -4.392936293, 3.175),
        (7.836259441, -5.662262745, 3.175),
        (20.028030667, -2.899960928, 3.175),
        (8.777051863, -1.805821766, 3.175),
        (17.41624219, 0.253545139, 3.175),
    ]]
    fillet(fillet1_of_cirpattern2_edges, radius=FILLET1_OF_CIRPATTERN2_R)

    # Fillet2 of CirPattern2
    fillet2_of_cirpattern2_edges = [part.edges().sort_by_distance(p)[0] for p in [
        (-4.582455452, 17.552001759, 1.5875),
        (-6.085215757, 12.508628115, 1.5875),
        (11.970541423, -7.399605162, 1.5875),
        (17.089611272, -6.17934694, 1.5875),
    ]]
    fillet(fillet2_of_cirpattern2_edges, radius=FILLET2_OF_CIRPATTERN2_R)

    # Fillet3 of CirPattern2
    fillet3_of_cirpattern2_edges = [part.edges().sort_by_distance(p)[0] for p in [
        (-13.802715652, 22.187326963, 0),
        (-13.802715652, 22.187326963, 5.425),
        (-16.33884676, 13.675885219, 5.425),
        (-16.33884676, 13.675885219, 0),
        (12.566362141, -17.702247326, 0),
        (12.566362141, -17.702247326, 5.425),
        (21.205552469, -15.642880421, 5.425),
        (21.205552469, -15.642880421, 0),
    ]]
    fillet(fillet3_of_cirpattern2_edges, radius=FILLET3_OF_CIRPATTERN2_R)

    # Fillet5
    fillet5_edges = [part.edges().sort_by_distance(p)[0] for p in [
        (-7.789671487, 9.240521362, 1.5875),
        (-3.951849266, 21.140080535, 1.5875),
        (20.879758905, -6.473021336, 1.5875),
        (8.655527257, -9.099149384, 1.5875),
        (20.045714571, 26.663830856, 2.5875),
        (28.432123998, 17.390399731, 2.5875),
    ]]
    fillet(fillet5_edges, radius=FILLET5_R)


solid = part.part
